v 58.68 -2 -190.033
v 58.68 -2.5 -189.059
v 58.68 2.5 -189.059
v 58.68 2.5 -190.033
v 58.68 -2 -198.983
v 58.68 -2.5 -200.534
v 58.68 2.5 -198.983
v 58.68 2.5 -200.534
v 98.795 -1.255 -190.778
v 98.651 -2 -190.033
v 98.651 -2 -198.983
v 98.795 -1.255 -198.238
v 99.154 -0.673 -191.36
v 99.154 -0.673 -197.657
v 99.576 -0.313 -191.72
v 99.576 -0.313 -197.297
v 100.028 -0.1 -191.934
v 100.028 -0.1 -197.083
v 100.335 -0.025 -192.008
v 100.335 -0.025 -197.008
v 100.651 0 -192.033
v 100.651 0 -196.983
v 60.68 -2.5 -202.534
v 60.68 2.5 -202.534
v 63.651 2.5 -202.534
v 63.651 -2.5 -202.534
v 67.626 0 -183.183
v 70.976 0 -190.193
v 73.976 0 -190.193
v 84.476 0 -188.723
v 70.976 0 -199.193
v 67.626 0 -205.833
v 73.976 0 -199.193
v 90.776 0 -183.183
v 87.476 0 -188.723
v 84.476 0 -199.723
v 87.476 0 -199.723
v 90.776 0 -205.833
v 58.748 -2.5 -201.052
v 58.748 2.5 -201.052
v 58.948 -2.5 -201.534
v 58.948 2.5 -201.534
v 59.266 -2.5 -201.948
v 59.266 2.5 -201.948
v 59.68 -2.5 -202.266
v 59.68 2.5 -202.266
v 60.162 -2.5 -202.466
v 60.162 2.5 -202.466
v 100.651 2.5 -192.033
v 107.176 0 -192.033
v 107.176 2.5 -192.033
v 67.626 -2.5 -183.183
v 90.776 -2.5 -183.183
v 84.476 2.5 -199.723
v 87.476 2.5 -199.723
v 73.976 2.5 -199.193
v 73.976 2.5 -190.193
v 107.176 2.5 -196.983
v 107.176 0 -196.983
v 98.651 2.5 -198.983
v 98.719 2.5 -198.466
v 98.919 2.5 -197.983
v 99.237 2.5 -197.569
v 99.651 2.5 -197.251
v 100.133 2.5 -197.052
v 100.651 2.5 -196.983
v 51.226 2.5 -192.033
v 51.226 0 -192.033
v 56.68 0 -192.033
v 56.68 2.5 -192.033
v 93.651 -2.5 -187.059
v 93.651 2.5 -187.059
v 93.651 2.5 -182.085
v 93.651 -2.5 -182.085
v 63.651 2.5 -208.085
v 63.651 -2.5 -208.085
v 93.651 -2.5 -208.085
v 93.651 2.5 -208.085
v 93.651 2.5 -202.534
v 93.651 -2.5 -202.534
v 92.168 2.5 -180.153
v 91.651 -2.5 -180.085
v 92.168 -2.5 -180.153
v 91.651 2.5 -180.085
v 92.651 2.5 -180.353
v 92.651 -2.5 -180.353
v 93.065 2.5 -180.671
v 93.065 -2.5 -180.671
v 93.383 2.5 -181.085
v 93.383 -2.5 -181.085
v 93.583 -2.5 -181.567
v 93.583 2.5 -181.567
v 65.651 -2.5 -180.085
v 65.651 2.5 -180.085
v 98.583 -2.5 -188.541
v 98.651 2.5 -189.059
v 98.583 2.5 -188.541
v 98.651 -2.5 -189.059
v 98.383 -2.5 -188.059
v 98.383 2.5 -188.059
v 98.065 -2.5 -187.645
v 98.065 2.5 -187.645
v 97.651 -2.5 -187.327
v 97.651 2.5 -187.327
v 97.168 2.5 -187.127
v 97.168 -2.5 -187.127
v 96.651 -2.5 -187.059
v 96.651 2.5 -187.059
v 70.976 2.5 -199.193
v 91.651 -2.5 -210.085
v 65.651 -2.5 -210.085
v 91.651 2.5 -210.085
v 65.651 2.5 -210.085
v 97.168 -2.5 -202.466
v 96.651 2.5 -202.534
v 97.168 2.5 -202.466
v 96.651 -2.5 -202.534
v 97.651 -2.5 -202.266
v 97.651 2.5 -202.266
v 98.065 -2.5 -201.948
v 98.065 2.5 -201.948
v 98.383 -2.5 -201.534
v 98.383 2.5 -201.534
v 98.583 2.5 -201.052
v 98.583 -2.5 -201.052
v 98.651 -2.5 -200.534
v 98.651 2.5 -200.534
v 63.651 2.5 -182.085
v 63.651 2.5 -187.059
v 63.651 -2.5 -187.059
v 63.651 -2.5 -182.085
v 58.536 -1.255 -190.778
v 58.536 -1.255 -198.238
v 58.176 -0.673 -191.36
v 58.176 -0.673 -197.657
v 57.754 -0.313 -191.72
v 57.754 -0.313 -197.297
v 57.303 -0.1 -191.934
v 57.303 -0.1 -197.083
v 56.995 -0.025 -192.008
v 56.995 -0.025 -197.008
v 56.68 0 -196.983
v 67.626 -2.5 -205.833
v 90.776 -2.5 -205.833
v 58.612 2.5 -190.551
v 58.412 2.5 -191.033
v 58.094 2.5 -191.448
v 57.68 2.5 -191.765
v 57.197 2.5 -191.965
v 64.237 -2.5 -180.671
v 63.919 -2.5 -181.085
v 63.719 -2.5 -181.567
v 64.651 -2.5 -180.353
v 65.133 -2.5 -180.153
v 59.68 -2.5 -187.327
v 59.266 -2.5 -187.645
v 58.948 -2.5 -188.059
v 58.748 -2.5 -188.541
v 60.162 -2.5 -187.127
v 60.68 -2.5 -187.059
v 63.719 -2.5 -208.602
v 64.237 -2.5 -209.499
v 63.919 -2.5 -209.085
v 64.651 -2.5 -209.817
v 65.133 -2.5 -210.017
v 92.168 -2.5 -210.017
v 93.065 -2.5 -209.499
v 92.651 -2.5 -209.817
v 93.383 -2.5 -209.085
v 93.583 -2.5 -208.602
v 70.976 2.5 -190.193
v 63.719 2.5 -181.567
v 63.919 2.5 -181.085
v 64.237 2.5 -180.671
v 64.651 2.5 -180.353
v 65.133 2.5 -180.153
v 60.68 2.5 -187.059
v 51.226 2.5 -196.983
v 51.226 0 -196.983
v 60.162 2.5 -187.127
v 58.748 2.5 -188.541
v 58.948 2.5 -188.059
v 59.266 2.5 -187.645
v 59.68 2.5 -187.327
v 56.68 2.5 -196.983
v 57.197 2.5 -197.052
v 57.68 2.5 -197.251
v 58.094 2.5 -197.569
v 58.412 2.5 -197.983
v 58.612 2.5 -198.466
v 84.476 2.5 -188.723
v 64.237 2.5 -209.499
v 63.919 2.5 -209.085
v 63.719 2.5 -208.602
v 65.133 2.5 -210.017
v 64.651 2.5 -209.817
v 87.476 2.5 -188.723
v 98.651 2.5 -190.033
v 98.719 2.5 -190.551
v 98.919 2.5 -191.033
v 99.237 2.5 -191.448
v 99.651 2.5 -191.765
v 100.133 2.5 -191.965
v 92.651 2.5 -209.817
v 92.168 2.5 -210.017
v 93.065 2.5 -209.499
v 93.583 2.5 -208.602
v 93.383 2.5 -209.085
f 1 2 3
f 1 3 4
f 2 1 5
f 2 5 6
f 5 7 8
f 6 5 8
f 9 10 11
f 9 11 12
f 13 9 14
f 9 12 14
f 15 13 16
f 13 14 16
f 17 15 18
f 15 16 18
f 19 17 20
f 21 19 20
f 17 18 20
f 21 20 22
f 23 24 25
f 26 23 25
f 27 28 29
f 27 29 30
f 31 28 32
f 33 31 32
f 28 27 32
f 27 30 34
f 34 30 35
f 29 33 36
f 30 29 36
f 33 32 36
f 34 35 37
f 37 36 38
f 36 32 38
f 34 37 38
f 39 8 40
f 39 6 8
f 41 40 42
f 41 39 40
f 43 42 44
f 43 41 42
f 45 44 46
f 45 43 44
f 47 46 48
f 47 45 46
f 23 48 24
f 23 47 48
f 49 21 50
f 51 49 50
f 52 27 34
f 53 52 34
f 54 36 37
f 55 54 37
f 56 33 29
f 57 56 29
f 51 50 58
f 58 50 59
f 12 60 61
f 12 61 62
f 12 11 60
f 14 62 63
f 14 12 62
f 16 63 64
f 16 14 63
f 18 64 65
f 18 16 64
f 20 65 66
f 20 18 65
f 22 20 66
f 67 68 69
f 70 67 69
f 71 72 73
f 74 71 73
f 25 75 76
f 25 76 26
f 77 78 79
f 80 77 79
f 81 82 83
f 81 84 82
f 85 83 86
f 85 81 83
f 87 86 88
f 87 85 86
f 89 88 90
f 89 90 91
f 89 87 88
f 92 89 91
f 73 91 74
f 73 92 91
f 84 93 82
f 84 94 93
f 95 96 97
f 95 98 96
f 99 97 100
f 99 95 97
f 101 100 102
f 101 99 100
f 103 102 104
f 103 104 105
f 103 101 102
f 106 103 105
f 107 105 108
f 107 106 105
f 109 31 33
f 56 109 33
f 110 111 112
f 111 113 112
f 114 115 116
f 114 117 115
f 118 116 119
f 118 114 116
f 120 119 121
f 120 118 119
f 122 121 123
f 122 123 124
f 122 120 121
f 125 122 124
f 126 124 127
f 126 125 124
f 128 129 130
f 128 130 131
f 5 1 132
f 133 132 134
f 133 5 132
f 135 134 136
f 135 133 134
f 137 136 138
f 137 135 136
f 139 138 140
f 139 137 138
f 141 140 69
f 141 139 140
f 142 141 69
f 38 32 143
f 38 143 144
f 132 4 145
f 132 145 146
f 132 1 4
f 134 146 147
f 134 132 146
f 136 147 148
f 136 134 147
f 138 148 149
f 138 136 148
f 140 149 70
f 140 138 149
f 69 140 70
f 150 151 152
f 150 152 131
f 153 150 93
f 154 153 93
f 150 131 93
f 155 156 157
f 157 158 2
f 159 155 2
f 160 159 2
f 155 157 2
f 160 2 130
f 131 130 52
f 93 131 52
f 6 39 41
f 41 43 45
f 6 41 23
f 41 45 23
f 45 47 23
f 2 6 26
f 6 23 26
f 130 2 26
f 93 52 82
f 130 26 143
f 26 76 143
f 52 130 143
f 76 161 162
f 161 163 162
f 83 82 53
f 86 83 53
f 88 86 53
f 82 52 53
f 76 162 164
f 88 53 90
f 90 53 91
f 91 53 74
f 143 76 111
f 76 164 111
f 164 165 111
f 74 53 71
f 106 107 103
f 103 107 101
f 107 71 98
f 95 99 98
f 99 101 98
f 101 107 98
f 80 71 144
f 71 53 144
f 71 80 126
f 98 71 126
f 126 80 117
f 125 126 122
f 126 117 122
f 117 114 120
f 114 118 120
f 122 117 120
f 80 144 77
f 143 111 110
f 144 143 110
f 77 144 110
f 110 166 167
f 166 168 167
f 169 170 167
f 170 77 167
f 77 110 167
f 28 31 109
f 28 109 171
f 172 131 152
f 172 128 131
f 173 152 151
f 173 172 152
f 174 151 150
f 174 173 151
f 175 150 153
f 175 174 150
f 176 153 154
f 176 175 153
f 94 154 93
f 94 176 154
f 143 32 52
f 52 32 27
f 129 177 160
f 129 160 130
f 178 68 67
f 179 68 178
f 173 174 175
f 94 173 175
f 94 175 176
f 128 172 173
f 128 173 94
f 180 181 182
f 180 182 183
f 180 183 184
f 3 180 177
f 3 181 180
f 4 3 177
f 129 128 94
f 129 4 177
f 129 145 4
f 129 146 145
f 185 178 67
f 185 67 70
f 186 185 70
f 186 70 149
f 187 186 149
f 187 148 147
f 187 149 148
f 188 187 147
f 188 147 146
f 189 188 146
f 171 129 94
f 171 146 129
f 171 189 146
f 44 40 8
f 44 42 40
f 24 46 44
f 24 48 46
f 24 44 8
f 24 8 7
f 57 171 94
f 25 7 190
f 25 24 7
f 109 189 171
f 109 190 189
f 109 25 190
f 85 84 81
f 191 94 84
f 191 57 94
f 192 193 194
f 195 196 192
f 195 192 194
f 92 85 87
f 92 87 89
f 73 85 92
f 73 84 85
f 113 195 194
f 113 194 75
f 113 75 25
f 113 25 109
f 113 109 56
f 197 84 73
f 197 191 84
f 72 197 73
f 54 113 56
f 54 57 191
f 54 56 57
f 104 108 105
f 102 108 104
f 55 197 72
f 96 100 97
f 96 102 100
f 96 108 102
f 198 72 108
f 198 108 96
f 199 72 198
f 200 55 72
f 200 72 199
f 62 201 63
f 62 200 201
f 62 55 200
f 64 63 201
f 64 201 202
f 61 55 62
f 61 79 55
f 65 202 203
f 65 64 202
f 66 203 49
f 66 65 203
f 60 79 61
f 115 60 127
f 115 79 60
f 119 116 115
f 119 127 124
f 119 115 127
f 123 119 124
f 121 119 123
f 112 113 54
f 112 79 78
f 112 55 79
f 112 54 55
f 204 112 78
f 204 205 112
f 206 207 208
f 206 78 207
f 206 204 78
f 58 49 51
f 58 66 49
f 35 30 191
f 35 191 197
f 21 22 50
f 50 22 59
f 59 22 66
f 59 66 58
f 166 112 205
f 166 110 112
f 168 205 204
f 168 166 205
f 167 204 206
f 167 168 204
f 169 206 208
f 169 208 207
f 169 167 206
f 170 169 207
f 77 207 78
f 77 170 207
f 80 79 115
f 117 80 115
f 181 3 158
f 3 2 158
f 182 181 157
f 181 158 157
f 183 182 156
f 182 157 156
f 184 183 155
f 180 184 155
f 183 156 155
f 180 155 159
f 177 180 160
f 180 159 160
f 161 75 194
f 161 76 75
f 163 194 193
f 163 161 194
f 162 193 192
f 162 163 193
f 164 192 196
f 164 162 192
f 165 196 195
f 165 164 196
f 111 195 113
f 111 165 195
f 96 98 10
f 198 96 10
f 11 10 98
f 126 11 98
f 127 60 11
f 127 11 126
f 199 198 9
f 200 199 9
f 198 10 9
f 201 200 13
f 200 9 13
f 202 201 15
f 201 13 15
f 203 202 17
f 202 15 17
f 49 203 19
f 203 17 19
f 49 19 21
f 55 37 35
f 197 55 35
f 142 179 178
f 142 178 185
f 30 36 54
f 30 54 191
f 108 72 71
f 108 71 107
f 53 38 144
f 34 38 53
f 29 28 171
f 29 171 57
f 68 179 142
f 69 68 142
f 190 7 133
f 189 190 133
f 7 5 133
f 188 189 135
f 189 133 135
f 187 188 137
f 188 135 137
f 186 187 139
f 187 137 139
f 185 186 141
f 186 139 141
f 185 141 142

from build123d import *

# Parameters (mm, degrees)
SKETCH1_W           = 55.95
SKETCH1_H           = 4.95
BOSS_EXTRUDE1_DEPTH = 2.5
SKETCH2_W           = 30
SKETCH2_H           = 30
BOSS_EXTRUDE2_DEPTH = 2.5
SKETCH3_W           = 30
SKETCH3_H           = 30
SKETCH3_W_2         = 23.15
SKETCH3_H_2         = 22.65
BOSS_EXTRUDE3_DEPTH = 2.5
SKETCH4_W           = 3
SKETCH4_H           = 9
CUT_EXTRUDE1_DEPTH  = 236.857029442
FILLET1_R           = 2
SKETCH5_W           = 4.971025799
SKETCH5_H           = 15.475
SKETCH5_W_2         = 5
BOSS_EXTRUDE4_DEPTH = 5
FILLET2_R           = 2
SKETCH6_W           = 3
SKETCH6_H           = 11
CUT_EXTRUDE2_DEPTH  = 236.857029442


with BuildPart() as part:
    # Sketch1 → Boss-Extrude1 (new body)
    with BuildSketch(Plane(origin=(0, 0, 0), x_dir=(1, 0, 0), z_dir=(0, 1, 0))):
        with Locations((79.200782246, 194.508385484)):
            Rectangle(SKETCH1_W, SKETCH1_H)
    extrude(amount=BOSS_EXTRUDE1_DEPTH)

    # Sketch2 → Boss-Extrude2 (add)
    with BuildSketch(Plane(origin=(0, 0, 0), x_dir=(1, 0, 0), z_dir=(0, 1, 0))):
        with Locations((78.650782246, 195.084840094)):
            Rectangle(SKETCH2_W, SKETCH2_H)
    extrude(amount=BOSS_EXTRUDE2_DEPTH)

    # Sketch3 → Boss-Extrude3 (add)
    with BuildSketch(Plane.XZ):
        with Locations((78.650782246, -195.084840094)):
            Rectangle(SKETCH3_W, SKETCH3_H)
        with Locations((79.200782246, -194.508385484)):
            Rectangle(SKETCH3_W_2, SKETCH3_H_2, mode=Mode.SUBTRACT)
    extrude(amount=BOSS_EXTRUDE3_DEPTH)

    # Sketch4 → Cut-Extrude1 (cut, through all)
    with BuildSketch(Plane.XZ):
        with Locations((72.475782246, -194.693385484)):
            Rectangle(SKETCH4_W, SKETCH4_H)
    extrude(amount=-CUT_EXTRUDE1_DEPTH, mode=Mode.SUBTRACT)

    # Fillet1
    fillet1_edges = [part.edges().sort_by_distance(p)[0] for p in [
        (63.650782246, 0, -210.084840094),
        (93.650782246, 0, -180.084840094),
        (63.650782246, 0, -180.084840094),
        (93.650782246, 0, -210.084840094),
    ]]
    fillet(fillet1_edges, radius=FILLET1_R)

    # Sketch5 → Boss-Extrude4 (add)
    with BuildSketch(Plane(origin=(0, 2.5, 0), x_dir=(1, 0, 0), z_dir=(0, 1, 0))):
        with Locations((61.165269347, 194.796612789)):
            Rectangle(SKETCH5_W, SKETCH5_H)
        with Locations((96.150782246, 194.796612789)):
            Rectangle(SKETCH5_W_2, SKETCH5_H)
    extrude(amount=-BOSS_EXTRUDE4_DEPTH)

    # Fillet2
    fillet2_edges = [part.edges().sort_by_distance(p)[0] for p in [
        (98.650782246, 0, -194.508385484),
        (58.679756447, 0, -194.508385484),
        (58.679756447, 0, -187.059112789),
        (58.679756447, 1.25, -192.033385484),
        (58.679756447, 1.25, -196.983385484),
        (58.679756447, 0, -202.534112789),
        (98.650782246, 0, -202.534112789),
        (98.650782246, 1.25, -192.033385484),
        (98.650782246, 1.25, -196.983385484),
        (98.650782246, 0, -187.059112789),
    ]]
    fillet(fillet2_edges, radius=FILLET2_R)

    # Sketch6 → Cut-Extrude2 (cut, through all)
    with BuildSketch(Plane.XZ):
        with Locations((85.975782246, -194.223385484)):
            Rectangle(SKETCH6_W, SKETCH6_H)
    extrude(amount=-CUT_EXTRUDE2_DEPTH, mode=Mode.SUBTRACT)


solid = part.part
